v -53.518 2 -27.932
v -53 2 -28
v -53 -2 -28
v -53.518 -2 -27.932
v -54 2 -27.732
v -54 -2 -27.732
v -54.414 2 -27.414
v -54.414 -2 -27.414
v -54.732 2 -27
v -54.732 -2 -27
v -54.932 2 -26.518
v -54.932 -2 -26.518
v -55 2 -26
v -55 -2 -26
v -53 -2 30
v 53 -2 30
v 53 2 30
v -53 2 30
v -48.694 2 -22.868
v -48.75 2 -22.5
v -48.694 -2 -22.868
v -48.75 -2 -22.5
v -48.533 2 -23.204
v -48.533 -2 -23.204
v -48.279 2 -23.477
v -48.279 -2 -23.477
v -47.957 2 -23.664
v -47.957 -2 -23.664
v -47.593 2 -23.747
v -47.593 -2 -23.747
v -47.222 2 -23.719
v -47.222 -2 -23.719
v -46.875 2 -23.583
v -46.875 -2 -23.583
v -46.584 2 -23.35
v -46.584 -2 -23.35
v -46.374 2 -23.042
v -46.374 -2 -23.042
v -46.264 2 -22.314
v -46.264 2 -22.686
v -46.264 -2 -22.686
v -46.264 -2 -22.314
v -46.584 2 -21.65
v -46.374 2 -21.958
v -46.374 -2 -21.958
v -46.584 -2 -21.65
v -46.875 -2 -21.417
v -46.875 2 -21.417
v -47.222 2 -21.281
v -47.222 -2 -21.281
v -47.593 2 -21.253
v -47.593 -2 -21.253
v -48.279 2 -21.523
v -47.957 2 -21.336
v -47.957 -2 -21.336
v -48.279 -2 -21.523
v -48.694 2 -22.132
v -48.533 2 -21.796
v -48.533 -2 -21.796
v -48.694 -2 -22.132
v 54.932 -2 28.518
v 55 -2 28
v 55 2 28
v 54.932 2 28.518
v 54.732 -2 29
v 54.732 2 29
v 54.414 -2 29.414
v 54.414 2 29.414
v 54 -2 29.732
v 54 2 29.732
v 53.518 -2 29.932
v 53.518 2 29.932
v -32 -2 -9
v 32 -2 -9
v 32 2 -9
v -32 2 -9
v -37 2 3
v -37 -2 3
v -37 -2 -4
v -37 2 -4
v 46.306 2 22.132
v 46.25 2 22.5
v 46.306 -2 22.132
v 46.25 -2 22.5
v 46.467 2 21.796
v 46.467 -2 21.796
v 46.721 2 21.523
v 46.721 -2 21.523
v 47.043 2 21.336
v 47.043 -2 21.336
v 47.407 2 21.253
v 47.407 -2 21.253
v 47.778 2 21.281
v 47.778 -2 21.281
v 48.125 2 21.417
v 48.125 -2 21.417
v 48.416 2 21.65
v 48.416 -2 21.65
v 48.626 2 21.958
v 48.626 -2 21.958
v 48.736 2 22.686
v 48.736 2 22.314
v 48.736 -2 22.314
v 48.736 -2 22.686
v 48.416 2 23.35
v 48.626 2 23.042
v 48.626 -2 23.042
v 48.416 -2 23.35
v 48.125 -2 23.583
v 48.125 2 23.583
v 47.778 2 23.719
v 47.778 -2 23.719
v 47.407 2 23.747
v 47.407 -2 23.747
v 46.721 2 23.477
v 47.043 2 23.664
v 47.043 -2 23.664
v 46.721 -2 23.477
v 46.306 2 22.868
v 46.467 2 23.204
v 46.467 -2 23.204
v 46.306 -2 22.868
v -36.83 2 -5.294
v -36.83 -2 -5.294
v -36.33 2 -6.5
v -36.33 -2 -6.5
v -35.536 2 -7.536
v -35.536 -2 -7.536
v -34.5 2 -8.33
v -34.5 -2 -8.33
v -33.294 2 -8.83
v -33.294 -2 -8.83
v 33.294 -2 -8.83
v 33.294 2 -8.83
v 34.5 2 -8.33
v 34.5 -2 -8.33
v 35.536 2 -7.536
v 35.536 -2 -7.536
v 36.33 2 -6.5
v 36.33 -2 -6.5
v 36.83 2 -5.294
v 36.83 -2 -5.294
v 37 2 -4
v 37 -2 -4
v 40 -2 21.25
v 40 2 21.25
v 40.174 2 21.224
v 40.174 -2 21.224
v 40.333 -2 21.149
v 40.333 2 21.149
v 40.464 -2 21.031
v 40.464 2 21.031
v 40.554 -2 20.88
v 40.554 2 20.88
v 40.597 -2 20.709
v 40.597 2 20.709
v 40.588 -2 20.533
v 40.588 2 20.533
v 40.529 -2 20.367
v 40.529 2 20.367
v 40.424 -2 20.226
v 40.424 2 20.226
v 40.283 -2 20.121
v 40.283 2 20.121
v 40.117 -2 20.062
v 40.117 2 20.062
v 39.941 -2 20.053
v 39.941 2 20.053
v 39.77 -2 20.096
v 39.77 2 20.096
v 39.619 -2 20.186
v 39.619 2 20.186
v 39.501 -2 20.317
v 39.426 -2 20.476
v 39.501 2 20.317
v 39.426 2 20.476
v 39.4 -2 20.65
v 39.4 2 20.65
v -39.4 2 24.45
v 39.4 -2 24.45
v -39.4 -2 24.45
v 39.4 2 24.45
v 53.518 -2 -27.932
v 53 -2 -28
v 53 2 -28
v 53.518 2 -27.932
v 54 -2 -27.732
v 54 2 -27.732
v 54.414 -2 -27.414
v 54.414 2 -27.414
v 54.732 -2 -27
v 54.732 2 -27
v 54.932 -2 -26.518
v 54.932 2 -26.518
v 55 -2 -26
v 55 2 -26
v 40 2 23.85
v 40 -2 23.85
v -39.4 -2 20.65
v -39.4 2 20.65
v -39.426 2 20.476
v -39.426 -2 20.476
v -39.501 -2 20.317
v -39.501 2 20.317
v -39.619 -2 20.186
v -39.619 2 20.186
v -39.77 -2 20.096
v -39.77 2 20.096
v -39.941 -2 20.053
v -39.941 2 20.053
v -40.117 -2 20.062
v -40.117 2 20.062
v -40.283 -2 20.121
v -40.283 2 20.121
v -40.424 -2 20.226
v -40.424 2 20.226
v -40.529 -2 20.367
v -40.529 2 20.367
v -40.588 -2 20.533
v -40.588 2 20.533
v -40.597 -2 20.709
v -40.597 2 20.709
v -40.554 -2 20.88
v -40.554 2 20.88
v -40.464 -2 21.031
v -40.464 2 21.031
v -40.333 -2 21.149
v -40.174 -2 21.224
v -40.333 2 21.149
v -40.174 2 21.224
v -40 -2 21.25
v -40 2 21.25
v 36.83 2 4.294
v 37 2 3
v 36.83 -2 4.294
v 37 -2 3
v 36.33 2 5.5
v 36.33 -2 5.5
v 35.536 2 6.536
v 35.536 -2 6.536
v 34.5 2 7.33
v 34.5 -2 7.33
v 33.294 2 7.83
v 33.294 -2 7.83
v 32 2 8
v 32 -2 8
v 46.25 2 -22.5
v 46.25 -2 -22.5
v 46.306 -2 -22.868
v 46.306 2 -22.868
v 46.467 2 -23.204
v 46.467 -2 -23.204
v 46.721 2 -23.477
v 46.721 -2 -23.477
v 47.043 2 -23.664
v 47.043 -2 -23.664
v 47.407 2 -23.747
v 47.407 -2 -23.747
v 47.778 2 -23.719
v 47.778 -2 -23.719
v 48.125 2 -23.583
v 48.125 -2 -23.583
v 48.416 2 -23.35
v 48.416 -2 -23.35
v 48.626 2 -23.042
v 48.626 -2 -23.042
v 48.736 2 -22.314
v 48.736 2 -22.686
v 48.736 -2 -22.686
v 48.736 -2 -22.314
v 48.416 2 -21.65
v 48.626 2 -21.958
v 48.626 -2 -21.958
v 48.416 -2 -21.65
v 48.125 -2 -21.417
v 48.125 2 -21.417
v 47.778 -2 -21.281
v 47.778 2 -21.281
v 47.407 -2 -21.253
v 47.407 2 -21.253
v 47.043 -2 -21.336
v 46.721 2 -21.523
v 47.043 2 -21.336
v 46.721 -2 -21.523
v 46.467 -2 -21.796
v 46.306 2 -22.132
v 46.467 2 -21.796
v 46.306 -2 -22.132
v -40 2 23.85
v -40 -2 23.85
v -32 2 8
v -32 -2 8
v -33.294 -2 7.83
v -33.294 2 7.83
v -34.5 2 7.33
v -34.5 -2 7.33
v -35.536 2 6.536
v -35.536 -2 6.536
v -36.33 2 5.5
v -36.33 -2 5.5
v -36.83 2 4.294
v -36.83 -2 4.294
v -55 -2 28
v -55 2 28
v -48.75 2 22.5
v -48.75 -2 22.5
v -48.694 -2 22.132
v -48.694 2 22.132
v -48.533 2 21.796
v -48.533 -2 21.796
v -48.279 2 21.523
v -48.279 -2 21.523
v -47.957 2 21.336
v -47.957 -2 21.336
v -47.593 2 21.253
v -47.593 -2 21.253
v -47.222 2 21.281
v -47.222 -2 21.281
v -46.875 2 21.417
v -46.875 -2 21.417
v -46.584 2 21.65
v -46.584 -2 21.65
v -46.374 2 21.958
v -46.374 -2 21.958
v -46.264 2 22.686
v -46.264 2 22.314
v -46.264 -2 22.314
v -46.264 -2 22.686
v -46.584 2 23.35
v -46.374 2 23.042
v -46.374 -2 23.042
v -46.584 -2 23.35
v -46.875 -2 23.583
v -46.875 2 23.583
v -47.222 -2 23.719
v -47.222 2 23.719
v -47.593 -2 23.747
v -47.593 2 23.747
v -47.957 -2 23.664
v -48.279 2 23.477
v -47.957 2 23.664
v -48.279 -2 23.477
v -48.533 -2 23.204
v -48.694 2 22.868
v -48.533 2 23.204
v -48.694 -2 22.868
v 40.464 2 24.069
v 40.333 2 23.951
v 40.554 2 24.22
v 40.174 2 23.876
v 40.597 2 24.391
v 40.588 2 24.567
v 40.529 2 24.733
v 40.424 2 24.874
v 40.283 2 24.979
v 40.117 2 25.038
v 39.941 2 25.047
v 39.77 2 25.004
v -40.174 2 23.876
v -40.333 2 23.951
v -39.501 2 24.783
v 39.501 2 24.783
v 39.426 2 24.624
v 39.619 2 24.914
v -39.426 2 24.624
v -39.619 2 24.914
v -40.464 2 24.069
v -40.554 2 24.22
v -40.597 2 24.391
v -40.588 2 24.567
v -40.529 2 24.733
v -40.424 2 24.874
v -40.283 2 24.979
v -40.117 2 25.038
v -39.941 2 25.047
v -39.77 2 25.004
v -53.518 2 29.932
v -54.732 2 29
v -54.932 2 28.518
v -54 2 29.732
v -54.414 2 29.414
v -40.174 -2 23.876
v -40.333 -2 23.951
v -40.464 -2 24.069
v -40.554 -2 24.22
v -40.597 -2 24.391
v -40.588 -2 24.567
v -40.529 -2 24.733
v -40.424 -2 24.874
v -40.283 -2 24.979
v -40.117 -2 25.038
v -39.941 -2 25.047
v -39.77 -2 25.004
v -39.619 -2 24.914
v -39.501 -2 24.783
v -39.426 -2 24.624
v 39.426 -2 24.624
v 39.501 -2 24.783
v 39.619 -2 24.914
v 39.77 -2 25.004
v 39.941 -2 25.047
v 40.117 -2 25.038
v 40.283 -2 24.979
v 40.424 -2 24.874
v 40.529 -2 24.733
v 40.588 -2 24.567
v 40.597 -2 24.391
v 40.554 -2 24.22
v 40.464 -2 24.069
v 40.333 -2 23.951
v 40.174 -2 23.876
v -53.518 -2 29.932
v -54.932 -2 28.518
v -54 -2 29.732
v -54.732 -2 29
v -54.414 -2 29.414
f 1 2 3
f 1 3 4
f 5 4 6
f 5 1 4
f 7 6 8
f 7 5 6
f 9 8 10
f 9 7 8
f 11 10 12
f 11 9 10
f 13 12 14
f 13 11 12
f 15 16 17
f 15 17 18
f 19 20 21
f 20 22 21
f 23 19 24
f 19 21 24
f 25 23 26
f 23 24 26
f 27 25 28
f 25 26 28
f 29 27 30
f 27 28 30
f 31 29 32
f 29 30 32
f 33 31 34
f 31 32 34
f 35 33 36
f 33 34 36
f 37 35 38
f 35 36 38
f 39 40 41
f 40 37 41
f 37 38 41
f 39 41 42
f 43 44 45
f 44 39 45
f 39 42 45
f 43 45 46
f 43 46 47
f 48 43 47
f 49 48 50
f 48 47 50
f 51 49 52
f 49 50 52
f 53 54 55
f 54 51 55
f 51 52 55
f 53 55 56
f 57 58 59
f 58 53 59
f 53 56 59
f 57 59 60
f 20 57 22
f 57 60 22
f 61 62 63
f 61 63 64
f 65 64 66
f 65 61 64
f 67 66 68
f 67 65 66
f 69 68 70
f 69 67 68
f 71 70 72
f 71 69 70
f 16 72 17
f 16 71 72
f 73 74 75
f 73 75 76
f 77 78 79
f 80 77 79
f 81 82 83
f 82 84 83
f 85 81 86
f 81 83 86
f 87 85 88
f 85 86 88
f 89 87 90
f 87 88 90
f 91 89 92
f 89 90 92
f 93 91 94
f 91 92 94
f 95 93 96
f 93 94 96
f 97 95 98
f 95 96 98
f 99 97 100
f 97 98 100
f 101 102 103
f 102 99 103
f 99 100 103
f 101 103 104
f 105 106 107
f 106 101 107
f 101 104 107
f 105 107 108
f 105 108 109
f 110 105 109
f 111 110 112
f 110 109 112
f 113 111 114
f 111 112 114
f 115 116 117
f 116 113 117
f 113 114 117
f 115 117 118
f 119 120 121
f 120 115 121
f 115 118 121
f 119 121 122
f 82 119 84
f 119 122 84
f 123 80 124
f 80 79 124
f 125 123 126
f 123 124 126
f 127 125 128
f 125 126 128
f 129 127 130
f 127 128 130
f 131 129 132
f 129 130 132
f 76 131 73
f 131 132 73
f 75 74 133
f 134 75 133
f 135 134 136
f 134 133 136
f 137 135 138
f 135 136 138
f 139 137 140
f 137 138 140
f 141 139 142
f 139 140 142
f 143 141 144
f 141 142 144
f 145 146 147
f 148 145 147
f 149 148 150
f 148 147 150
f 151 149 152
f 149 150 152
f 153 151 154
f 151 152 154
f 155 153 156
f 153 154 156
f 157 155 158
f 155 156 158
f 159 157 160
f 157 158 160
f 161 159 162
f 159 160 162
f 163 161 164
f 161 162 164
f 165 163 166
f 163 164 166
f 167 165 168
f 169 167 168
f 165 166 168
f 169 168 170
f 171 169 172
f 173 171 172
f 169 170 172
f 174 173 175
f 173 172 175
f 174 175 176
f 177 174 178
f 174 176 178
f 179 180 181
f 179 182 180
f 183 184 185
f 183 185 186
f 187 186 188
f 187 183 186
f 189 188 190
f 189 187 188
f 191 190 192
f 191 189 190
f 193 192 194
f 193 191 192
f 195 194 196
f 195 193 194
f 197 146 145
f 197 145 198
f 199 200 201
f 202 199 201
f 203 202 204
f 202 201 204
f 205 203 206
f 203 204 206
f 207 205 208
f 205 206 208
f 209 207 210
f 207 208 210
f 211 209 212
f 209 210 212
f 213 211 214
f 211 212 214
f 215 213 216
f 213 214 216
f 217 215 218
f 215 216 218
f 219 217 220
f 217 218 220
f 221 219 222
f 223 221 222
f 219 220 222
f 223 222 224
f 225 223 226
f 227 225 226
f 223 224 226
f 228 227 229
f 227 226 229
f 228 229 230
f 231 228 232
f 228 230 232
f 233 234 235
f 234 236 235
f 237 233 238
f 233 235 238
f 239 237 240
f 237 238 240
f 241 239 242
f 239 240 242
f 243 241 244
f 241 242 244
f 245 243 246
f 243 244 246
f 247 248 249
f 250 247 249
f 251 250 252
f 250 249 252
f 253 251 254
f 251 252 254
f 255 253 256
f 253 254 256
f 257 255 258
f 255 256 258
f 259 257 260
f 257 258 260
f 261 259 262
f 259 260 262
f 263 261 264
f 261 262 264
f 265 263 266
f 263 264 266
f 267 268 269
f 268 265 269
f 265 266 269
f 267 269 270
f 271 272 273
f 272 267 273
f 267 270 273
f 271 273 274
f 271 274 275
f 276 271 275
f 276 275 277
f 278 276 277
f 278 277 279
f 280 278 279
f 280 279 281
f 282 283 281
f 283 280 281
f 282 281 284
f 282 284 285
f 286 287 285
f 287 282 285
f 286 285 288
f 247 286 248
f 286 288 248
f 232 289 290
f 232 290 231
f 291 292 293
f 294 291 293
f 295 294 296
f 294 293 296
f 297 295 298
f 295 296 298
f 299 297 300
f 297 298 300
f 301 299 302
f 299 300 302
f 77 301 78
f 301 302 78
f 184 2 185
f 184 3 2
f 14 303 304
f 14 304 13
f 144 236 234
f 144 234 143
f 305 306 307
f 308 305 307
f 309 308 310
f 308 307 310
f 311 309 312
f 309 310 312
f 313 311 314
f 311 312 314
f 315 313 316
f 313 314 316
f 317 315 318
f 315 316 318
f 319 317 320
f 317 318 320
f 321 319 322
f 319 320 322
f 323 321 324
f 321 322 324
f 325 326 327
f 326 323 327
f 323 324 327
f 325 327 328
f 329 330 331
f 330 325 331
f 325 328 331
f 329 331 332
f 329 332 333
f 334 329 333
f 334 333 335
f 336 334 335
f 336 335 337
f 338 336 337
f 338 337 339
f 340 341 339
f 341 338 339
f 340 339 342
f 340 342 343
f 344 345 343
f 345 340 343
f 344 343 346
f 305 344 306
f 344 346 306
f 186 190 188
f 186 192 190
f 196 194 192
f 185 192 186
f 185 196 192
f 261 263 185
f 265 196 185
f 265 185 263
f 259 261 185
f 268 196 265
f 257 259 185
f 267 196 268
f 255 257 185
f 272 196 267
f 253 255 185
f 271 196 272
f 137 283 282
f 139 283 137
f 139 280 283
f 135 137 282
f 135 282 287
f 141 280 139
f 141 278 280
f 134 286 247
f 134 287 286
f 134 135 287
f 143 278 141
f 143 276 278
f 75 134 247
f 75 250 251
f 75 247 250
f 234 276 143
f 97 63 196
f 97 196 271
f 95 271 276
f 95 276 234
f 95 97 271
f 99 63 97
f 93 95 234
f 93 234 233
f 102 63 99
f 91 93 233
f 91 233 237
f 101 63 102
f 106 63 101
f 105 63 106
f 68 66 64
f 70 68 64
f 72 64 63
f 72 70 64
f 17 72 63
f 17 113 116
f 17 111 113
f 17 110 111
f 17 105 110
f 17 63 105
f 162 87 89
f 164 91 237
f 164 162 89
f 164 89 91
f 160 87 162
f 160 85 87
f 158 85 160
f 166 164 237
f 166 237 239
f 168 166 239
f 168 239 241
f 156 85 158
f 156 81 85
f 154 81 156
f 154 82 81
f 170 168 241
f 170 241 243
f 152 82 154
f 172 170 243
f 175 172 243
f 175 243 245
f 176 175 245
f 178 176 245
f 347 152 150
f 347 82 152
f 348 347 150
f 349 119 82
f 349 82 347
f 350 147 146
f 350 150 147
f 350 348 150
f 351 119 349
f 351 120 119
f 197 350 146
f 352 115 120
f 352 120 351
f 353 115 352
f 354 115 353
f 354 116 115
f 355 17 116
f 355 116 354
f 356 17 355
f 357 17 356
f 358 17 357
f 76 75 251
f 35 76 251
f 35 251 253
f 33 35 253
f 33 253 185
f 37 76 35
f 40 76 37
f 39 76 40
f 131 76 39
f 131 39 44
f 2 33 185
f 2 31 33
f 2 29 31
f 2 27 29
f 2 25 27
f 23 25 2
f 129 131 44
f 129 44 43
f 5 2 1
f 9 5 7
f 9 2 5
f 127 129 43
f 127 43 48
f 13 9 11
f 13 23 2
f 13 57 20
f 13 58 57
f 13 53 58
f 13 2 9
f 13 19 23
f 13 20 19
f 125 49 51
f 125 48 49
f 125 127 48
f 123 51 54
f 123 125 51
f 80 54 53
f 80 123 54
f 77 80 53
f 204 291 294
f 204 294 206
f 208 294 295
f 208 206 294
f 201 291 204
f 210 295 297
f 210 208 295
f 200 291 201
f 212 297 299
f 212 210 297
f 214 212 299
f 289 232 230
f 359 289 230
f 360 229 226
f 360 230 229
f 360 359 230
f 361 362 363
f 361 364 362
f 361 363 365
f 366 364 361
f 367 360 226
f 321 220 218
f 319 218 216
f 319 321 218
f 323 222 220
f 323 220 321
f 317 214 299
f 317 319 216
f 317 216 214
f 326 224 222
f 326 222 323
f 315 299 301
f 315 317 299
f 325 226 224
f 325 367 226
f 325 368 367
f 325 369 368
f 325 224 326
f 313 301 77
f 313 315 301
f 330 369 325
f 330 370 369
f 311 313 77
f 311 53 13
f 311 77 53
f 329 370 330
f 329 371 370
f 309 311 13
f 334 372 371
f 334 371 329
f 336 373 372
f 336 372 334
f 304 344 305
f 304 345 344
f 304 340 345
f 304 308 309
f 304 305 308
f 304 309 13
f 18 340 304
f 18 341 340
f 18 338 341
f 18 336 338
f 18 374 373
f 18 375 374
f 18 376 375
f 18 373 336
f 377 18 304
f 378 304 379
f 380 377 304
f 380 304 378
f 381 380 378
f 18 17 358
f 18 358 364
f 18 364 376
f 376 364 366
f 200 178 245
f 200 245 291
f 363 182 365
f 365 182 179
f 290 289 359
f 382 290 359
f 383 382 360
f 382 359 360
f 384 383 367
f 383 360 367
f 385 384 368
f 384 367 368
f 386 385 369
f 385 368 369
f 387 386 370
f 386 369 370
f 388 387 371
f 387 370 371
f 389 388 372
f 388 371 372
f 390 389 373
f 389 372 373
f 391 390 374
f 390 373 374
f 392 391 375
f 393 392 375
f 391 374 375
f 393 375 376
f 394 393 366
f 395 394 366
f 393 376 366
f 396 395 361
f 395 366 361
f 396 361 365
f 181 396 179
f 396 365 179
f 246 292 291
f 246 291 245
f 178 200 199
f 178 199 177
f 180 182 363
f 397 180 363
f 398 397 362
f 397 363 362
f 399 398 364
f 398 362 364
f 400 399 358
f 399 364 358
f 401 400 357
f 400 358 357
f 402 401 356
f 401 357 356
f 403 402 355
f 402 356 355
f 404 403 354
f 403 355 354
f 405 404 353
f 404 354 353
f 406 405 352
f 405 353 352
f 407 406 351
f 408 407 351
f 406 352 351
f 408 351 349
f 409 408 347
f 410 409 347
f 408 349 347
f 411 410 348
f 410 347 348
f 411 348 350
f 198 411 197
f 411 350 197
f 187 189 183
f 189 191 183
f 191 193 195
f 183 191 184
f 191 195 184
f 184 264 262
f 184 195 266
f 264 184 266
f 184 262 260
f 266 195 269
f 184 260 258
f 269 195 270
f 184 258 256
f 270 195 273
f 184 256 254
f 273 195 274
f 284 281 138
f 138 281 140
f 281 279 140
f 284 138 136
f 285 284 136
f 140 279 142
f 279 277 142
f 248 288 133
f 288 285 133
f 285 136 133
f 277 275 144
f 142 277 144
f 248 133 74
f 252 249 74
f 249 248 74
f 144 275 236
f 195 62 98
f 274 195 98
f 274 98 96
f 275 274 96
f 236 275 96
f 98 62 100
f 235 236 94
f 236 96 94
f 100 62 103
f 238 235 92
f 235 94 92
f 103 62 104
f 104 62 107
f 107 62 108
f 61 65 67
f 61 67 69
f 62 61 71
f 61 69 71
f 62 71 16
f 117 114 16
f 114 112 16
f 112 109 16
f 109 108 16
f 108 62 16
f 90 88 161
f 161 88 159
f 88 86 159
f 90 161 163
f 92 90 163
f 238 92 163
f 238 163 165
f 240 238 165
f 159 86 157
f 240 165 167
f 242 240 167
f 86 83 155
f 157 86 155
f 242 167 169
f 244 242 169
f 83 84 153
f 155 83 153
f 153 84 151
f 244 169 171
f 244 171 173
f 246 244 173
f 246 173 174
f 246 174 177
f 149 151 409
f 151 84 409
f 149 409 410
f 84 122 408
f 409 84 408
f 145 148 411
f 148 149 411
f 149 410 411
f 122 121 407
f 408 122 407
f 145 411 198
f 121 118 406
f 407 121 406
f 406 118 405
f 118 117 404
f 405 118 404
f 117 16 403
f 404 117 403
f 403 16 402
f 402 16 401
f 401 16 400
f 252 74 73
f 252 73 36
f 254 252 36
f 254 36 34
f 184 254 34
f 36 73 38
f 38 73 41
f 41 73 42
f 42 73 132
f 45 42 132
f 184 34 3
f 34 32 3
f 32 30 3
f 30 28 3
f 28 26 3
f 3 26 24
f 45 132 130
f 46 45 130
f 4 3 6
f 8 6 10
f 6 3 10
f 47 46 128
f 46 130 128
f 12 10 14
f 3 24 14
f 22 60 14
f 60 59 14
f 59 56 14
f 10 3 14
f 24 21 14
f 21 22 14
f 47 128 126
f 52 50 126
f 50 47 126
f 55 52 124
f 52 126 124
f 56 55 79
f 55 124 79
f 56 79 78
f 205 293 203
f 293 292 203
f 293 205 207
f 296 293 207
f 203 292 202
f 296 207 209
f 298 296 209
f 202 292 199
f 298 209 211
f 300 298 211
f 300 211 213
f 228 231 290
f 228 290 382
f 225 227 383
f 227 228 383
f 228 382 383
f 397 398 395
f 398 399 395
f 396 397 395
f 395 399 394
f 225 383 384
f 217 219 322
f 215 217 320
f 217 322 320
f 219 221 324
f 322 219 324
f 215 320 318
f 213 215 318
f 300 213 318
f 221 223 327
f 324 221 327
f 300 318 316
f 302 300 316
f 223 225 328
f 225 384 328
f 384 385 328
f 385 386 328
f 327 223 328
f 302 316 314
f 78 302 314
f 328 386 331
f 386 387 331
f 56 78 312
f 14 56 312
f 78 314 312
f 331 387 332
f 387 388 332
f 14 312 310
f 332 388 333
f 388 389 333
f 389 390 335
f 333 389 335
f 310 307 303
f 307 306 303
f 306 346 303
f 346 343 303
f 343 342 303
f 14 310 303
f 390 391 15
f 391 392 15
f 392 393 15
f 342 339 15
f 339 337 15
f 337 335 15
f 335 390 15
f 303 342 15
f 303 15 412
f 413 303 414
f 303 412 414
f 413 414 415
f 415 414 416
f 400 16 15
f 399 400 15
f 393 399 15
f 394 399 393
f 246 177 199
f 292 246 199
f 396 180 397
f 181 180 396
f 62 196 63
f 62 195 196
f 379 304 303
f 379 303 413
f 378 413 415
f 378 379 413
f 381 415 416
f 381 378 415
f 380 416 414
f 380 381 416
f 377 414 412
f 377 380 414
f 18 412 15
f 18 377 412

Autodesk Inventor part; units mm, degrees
ref_plane "YZ Plane" through (0, 0, 0) normal (1, 0, 0) x (0, 1, 0)
ref_plane "XZ Plane" through (0, 0, 0) normal (0, 1, 0) x (-1, 0, 0)
ref_plane "XY Plane" through (0, 0, 0) normal (0, 0, 1) x (1, 0, 0)
sketch "Sketch1" plane through (0, 0, 0) normal (0, 1, 0) x (-1, 0, 0)
  line L0 (55, -28) -> (-55, -28)
  line L1 (-55, -28) -> (-55, 28)
  line L2 (-55, 28) -> (55, 28) construction
  line L3 (55, 28) -> (55, -28)
  circle A0 centre (47.5, -22.5) radius 1.25
  circle A1 centre (-47.5, -22.5) radius 1.25
  circle A2 centre (-47.5, 22.5) radius 1.25
  circle A3 centre (47.5, 22.5) radius 1.25
  line L4 (47.5, -22.5) -> (-47.5, -22.5) construction
  line L5 (-47.5, -22.5) -> (-47.5, 22.5) construction
  line L6 (-32, -9) -> (32, -9)
  line L7 (32, 8) -> (-32, 8)
  line L8 (-55, 28) -> (-55, 30)
  line L9 (-55, 30) -> (55, 30)
  line L10 (55, 30) -> (55, 28)
  line L11 (37, 3) -> (37, -4)
  line L12 (-37, 3) -> (-37, -4)
  arc A4 (37, 3) -> (32, 8) centre (32, 3) ccw
  arc A5 (32, -9) -> (37, -4) centre (32, -4) ccw
  arc A6 (-32, 8) -> (-37, 3) centre (-32, 3) ccw
  arc A7 (-37, -4) -> (-32, -9) centre (-32, -4) ccw
  point P0 (0, 0)
  point P1 (-55, 0)
  point P2 (0, 28)
  point P3 (-47.5, 0)
  point P4 (0, -22.5)
  point P5 (-37, -9)
  point P6 (37, -9)
  point P7 (37, 8)
  point P8 (-37, 8)
  point P9 (0, 8)
  dimension "d0" = 110
  dimension "d1" = 56
  dimension "d2" = 2.5
  dimension "d3" = 95
  dimension "d4" = 45
  dimension "d18" = 2
  dimension "d20" = 74
  dimension "d21" = 19
  dimension "d22" = 17
  dimension "d23" = 5
extrude "Extrusion1" add sketch "Sketch1" along normal mid plane 4
fillet "Fillet1" radius 2 4 edges at (55, 0, -28) (-55, 0, -28) (-55, 0, 30) (55, 0, 30)
sketch "Sketch2" plane through (0, 2, 0) normal (0, 1, 0) x (1, 0, 0)
  line L0 (-40, -20.65) -> (-39.4, -20.65) construction
  line L1 (40, -20.65) -> (40, -21.25) construction
  line L2 (40, -24.45) -> (39.4, -24.45) construction
  line L3 (-40, -24.45) -> (-40, -23.85) construction
  arc A0 (-40, -23.85) -> (-39.4, -24.45) centre (-40, -24.45) ccw
  arc A1 (-39.4, -20.65) -> (-40, -21.25) centre (-40, -20.65) ccw
  arc A2 (40, -21.25) -> (39.4, -20.65) centre (40, -20.65) ccw
  arc A3 (39.4, -24.45) -> (40, -23.85) centre (40, -24.45) ccw
  line L4 (-40, -23.85) -> (-40, -21.25)
  line L5 (-39.4, -24.45) -> (-40, -24.45) construction
  arc A4 (-40, -21.25) -> (-39.4, -20.65) centre (-40, -20.65) ccw construction
  line L6 (-40, -21.25) -> (-40, -20.65) construction
  line L7 (-39.4, -20.65) -> (39.4, -20.65)
  line L8 (39.4, -24.45) -> (-39.4, -24.45)
  line L9 (40, -23.85) -> (40, -24.45) construction
  arc A5 (40, -23.85) -> (39.4, -24.45) centre (40, -24.45) ccw construction
  arc A6 (39.4, -20.65) -> (40, -21.25) centre (40, -20.65) ccw construction
  line L10 (40, -21.25) -> (40, -23.85)
  line L11 (39.4, -20.65) -> (40, -20.65) construction
  line L12 (-53, -30) -> (53, -30) projected
  point P0 (0, 0)
  point P1 (0, -24.45)
  dimension "d9" = 3.8
  dimension "d11" = 80
  dimension "d14" = 1.2
  dimension "d19" = 5.55
extrude "Extrusion2" cut sketch "Sketch2" against normal through all
properties part number "Marco conectores IC DC" material "Polycarbonate, Smoke"
